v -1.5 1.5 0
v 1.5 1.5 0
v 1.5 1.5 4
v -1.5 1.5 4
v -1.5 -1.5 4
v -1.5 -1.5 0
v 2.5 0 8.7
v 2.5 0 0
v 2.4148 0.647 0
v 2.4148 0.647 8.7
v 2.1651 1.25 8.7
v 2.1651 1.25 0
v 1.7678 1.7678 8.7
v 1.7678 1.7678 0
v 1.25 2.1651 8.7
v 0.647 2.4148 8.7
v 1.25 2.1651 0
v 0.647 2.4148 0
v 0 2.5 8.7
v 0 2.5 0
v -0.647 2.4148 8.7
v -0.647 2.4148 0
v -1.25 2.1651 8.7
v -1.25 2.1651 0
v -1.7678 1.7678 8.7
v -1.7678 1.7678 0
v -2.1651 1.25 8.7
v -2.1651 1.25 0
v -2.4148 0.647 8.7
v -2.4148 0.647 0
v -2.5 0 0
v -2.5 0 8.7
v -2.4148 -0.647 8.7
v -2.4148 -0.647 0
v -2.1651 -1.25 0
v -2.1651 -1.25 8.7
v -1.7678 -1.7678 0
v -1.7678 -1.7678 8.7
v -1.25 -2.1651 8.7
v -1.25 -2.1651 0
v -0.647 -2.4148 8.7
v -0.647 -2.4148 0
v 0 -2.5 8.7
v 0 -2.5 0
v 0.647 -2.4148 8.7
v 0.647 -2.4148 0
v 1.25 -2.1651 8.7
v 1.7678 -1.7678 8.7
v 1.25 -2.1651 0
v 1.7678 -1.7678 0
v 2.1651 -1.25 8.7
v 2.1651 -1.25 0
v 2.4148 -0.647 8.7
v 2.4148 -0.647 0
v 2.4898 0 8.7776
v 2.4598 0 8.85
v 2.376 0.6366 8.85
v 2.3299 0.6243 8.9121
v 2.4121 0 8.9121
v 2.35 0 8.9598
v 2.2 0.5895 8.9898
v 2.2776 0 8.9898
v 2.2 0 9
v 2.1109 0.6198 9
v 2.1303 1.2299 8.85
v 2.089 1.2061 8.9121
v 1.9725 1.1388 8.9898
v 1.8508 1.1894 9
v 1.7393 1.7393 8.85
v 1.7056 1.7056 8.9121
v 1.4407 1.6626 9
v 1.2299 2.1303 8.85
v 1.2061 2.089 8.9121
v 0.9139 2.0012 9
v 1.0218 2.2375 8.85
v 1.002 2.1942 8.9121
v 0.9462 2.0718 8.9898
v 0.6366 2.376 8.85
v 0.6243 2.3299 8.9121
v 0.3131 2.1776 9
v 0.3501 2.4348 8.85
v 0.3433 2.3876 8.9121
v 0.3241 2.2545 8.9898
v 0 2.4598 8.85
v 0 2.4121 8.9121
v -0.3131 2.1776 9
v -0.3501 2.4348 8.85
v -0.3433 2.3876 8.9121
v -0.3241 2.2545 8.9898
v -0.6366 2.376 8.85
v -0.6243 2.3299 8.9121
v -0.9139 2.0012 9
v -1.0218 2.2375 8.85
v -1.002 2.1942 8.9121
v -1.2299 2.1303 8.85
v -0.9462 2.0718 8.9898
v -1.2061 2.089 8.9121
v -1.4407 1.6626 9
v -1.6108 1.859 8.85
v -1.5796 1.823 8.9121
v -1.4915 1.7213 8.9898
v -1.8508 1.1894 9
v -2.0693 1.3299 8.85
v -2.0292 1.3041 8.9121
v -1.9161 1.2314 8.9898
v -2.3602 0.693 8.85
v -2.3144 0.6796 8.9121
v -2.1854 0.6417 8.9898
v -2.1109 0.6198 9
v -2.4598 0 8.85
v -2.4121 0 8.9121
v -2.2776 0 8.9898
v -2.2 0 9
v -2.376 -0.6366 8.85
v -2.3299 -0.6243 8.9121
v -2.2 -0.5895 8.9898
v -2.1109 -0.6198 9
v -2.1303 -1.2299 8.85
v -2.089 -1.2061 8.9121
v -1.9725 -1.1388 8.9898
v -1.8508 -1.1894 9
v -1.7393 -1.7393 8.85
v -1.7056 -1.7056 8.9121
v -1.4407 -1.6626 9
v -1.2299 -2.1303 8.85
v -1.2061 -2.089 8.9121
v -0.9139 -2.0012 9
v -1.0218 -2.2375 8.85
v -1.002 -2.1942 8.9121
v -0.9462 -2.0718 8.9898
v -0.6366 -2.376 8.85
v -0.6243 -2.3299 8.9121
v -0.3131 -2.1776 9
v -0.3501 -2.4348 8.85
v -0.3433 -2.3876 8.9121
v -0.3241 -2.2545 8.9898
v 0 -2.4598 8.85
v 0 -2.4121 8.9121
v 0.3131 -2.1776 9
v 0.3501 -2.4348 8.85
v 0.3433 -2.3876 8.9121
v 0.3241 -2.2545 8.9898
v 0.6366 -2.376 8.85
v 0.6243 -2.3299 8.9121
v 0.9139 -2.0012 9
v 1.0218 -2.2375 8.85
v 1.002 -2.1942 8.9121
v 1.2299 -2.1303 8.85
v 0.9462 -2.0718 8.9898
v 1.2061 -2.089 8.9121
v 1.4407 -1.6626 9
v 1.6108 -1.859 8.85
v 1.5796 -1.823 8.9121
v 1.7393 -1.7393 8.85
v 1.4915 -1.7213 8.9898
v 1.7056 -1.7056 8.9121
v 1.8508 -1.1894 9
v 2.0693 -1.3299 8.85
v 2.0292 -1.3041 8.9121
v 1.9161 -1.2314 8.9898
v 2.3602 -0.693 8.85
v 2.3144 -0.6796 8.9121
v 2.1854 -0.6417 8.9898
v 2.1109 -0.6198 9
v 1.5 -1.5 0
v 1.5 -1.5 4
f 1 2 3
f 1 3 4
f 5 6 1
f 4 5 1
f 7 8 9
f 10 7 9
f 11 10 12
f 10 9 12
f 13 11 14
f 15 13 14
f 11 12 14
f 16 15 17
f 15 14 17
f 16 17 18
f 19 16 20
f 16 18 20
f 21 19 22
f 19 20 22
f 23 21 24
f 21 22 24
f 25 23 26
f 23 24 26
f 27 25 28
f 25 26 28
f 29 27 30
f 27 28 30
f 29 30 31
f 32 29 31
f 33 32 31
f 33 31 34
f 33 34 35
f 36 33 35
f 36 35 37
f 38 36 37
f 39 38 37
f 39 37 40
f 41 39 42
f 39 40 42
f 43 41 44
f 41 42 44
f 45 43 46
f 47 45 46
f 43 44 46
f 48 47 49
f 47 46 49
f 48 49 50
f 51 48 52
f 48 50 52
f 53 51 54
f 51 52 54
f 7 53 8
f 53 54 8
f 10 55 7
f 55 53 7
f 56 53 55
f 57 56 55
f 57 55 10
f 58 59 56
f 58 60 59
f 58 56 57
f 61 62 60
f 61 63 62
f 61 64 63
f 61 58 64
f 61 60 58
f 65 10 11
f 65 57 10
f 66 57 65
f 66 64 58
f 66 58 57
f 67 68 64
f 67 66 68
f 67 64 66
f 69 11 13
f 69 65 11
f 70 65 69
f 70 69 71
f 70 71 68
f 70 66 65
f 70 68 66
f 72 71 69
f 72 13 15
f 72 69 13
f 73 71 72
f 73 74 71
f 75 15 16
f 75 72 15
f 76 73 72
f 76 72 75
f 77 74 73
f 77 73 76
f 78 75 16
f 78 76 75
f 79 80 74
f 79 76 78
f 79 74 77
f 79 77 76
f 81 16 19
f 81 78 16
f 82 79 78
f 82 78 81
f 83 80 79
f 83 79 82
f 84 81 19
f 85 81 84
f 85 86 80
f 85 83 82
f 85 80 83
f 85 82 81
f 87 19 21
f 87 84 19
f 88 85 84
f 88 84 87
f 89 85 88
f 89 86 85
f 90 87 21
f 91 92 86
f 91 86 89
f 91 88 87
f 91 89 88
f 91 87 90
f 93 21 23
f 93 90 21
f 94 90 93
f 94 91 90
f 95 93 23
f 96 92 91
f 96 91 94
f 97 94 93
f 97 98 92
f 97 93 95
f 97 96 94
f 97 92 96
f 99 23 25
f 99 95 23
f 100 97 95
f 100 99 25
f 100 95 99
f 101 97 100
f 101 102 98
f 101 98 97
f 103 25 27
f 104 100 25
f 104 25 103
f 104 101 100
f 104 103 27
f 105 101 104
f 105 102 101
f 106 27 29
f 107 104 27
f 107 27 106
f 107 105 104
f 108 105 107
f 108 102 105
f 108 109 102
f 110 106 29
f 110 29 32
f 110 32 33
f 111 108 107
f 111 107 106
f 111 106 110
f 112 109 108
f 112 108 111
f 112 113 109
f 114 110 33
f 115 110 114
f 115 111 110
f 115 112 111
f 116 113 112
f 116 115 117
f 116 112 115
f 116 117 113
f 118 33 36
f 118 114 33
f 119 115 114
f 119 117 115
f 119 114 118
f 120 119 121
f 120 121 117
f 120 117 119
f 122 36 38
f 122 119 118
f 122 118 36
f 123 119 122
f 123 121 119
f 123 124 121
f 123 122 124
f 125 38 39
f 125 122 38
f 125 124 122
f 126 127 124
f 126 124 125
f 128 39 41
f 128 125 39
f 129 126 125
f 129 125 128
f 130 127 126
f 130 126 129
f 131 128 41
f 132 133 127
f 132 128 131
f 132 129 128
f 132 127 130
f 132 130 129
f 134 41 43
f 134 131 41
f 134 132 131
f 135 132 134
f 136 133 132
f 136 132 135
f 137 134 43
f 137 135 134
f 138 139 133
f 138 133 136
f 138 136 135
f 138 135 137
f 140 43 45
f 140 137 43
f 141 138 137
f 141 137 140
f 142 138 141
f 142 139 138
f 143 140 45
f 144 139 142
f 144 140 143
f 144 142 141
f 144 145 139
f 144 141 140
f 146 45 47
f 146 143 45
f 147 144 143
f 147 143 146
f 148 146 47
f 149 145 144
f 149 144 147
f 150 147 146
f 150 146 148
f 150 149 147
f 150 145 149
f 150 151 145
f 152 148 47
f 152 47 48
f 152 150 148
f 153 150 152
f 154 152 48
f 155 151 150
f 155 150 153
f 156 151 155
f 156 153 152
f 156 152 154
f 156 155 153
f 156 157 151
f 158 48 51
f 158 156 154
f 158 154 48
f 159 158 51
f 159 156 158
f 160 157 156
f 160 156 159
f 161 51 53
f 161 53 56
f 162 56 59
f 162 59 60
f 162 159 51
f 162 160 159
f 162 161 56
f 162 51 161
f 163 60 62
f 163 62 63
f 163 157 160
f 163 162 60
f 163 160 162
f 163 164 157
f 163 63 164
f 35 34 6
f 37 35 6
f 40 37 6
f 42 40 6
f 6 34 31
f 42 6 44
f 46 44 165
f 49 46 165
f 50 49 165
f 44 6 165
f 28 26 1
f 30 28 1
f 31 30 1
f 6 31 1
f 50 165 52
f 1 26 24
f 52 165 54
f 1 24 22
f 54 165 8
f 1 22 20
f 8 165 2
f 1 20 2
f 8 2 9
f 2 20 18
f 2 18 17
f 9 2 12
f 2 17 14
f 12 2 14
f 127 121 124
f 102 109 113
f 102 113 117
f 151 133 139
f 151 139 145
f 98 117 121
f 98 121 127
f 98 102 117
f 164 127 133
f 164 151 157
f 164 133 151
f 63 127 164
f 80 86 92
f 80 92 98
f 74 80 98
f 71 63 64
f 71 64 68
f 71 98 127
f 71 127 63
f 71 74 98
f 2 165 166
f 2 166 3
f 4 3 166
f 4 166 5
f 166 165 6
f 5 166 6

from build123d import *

# Parameters (mm, degrees)
SKETCH1_R           = 2.5
BOSS_EXTRUDE1_DEPTH = 9
FILLET1_R           = 0.3
SKETCH2_W           = 3
SKETCH2_H           = 3
CUT_EXTRUDE1_DEPTH  = 4


with BuildPart() as part:
    # Sketch1 → Boss-Extrude1 (new body)
    with BuildSketch(Plane.XY):
        Circle(SKETCH1_R)
    extrude(amount=BOSS_EXTRUDE1_DEPTH)

    # Fillet1
    fillet1_edges = [part.edges().sort_by_distance(p)[0] for p in [
        (-2.5, 0, 9),
    ]]
    fillet(fillet1_edges, radius=FILLET1_R)

    # Sketch2 → Cut-Extrude1 (cut)
    with BuildSketch(Plane(origin=(0, 0, 0), x_dir=(-1, 0, 0), z_dir=(0, 0, -1))):
        Rectangle(SKETCH2_W, SKETCH2_H)
    extrude(amount=-CUT_EXTRUDE1_DEPTH, mode=Mode.SUBTRACT)


solid = part.part
